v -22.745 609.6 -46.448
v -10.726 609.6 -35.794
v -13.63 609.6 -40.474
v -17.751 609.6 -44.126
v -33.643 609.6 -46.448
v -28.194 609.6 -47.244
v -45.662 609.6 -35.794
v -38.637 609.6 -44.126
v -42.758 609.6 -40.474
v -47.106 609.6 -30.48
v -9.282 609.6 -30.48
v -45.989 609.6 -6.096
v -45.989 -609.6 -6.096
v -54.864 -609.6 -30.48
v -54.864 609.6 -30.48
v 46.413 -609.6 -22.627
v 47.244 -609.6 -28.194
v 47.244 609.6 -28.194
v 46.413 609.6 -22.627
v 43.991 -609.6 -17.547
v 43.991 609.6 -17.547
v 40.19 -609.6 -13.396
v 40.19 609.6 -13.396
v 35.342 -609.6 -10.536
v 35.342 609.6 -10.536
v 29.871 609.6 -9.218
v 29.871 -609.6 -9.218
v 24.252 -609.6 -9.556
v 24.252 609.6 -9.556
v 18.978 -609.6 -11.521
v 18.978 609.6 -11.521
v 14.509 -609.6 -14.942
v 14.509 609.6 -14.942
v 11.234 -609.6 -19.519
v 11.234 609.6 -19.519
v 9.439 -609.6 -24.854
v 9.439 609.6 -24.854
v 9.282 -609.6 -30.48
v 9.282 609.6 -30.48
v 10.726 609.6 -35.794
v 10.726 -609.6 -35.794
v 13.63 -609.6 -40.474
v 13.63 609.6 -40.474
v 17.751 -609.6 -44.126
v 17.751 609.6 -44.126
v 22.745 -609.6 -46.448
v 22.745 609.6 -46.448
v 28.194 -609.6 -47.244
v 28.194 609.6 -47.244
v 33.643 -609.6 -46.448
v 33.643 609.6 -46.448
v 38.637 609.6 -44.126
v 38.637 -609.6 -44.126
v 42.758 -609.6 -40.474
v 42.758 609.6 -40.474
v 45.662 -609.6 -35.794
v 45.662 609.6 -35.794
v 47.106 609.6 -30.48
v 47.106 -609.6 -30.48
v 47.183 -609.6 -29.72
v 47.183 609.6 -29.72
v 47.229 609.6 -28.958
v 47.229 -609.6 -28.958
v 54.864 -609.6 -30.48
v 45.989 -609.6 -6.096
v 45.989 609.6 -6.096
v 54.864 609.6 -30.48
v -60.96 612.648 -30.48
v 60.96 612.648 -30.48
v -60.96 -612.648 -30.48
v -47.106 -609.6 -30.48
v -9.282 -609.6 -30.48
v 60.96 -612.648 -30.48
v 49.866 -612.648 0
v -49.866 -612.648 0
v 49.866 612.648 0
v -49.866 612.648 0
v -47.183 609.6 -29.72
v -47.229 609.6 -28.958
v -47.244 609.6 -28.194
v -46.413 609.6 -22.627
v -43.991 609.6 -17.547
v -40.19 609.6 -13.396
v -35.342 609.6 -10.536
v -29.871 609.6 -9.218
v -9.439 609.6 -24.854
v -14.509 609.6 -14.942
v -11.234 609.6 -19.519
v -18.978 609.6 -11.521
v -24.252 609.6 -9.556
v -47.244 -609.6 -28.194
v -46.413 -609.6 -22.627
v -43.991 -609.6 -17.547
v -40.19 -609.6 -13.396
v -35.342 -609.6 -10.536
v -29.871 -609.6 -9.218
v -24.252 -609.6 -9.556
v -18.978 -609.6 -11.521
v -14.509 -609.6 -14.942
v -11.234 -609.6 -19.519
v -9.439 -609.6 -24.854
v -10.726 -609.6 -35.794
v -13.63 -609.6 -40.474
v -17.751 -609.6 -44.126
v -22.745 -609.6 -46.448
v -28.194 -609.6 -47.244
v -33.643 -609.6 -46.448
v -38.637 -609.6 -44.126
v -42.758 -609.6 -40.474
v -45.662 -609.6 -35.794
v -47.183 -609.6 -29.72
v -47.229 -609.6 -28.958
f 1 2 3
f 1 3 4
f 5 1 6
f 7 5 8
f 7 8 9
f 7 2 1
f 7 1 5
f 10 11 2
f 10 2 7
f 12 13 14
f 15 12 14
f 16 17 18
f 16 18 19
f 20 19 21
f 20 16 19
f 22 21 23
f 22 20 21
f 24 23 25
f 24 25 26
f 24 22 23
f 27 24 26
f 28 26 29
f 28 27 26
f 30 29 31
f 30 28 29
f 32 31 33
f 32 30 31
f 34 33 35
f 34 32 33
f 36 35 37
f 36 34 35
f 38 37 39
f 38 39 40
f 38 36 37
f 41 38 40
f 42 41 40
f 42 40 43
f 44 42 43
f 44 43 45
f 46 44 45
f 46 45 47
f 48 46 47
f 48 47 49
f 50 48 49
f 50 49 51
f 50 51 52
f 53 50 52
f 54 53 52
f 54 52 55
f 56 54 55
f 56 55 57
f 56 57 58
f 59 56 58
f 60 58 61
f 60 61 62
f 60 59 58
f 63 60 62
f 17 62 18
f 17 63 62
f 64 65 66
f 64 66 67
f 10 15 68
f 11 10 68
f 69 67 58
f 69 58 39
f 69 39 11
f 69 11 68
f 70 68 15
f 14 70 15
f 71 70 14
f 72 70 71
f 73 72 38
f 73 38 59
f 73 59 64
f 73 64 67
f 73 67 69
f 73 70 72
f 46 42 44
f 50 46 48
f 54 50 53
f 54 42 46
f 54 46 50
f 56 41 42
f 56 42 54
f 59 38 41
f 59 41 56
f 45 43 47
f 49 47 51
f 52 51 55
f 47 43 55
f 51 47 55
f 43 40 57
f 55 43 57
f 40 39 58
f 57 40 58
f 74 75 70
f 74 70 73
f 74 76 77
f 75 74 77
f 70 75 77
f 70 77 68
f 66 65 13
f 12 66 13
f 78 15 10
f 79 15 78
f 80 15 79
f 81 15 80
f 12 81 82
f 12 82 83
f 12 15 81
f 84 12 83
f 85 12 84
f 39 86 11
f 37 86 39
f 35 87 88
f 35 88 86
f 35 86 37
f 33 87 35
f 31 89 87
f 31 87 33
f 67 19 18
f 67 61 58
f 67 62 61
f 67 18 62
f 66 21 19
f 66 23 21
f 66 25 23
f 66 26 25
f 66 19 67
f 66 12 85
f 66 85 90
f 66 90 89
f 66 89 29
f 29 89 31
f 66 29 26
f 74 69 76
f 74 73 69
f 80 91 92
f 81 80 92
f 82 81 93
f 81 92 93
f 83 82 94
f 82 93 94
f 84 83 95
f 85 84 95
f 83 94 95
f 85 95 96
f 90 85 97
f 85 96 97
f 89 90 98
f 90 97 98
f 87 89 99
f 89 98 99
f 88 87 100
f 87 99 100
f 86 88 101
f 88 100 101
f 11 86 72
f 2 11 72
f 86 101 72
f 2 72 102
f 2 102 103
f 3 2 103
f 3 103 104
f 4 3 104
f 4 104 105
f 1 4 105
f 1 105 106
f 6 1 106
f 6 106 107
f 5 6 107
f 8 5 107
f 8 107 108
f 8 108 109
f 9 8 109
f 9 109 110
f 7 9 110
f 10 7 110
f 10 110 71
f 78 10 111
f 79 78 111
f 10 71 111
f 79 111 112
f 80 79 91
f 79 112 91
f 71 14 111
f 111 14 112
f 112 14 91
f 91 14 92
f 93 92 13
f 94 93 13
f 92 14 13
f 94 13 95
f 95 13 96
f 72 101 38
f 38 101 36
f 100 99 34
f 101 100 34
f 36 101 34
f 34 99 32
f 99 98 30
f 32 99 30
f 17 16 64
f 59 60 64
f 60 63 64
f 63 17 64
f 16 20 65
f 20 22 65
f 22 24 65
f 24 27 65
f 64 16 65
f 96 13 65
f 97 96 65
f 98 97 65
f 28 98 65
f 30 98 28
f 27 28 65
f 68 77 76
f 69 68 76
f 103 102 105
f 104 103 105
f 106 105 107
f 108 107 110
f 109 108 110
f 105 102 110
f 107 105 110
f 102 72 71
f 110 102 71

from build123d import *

# Parameters (mm, degrees)
F1_DEPTH = 609.6
F0_R     = 19.05
F4_DEPTH = 3.048


with BuildPart() as f1:
    # F0 (on Front) → F1 (new body, symmetric)
    with BuildSketch(Plane.XZ):
        Polygon((49.8661872596, 0), (0, 0), (0, -6.096), (45.9889498077, -6.096), (54.864, -30.48), (60.96, -30.48), align=None)
    extrude(amount=F1_DEPTH, both=True)



with BuildPart() as f1b:
    # F0 (on Front) → F1, piece 2 (new body, symmetric)
    with BuildSketch(Plane.XZ):
        with Locations((28.194, -28.194)):
            Circle(F0_R)
    extrude(amount=F1_DEPTH, both=True)


with BuildPart() as f1_1:
    add(f1.part)
    # F2: F1b, F1 across plane
    add(f1b.part.mirror(Plane.YZ))
    add(f1.part.mirror(Plane.YZ))


    add(f1b.part)  # F4 merges F1b
    # F3 (on face) → F4 (join)
    with BuildSketch(Plane.XZ.offset(609.6)):
        Polygon((49.8661872596, 0), (-49.8661872596, 0), (-60.96, -30.48), (60.96, -30.48), align=None)
    extrude(amount=F4_DEPTH)

    # F5: F1 across plane


with BuildPart() as f1_2:
    add(f1_1.part)
    add(f1_1.part.mirror(Plane.XZ))


solid = f1_2.part
